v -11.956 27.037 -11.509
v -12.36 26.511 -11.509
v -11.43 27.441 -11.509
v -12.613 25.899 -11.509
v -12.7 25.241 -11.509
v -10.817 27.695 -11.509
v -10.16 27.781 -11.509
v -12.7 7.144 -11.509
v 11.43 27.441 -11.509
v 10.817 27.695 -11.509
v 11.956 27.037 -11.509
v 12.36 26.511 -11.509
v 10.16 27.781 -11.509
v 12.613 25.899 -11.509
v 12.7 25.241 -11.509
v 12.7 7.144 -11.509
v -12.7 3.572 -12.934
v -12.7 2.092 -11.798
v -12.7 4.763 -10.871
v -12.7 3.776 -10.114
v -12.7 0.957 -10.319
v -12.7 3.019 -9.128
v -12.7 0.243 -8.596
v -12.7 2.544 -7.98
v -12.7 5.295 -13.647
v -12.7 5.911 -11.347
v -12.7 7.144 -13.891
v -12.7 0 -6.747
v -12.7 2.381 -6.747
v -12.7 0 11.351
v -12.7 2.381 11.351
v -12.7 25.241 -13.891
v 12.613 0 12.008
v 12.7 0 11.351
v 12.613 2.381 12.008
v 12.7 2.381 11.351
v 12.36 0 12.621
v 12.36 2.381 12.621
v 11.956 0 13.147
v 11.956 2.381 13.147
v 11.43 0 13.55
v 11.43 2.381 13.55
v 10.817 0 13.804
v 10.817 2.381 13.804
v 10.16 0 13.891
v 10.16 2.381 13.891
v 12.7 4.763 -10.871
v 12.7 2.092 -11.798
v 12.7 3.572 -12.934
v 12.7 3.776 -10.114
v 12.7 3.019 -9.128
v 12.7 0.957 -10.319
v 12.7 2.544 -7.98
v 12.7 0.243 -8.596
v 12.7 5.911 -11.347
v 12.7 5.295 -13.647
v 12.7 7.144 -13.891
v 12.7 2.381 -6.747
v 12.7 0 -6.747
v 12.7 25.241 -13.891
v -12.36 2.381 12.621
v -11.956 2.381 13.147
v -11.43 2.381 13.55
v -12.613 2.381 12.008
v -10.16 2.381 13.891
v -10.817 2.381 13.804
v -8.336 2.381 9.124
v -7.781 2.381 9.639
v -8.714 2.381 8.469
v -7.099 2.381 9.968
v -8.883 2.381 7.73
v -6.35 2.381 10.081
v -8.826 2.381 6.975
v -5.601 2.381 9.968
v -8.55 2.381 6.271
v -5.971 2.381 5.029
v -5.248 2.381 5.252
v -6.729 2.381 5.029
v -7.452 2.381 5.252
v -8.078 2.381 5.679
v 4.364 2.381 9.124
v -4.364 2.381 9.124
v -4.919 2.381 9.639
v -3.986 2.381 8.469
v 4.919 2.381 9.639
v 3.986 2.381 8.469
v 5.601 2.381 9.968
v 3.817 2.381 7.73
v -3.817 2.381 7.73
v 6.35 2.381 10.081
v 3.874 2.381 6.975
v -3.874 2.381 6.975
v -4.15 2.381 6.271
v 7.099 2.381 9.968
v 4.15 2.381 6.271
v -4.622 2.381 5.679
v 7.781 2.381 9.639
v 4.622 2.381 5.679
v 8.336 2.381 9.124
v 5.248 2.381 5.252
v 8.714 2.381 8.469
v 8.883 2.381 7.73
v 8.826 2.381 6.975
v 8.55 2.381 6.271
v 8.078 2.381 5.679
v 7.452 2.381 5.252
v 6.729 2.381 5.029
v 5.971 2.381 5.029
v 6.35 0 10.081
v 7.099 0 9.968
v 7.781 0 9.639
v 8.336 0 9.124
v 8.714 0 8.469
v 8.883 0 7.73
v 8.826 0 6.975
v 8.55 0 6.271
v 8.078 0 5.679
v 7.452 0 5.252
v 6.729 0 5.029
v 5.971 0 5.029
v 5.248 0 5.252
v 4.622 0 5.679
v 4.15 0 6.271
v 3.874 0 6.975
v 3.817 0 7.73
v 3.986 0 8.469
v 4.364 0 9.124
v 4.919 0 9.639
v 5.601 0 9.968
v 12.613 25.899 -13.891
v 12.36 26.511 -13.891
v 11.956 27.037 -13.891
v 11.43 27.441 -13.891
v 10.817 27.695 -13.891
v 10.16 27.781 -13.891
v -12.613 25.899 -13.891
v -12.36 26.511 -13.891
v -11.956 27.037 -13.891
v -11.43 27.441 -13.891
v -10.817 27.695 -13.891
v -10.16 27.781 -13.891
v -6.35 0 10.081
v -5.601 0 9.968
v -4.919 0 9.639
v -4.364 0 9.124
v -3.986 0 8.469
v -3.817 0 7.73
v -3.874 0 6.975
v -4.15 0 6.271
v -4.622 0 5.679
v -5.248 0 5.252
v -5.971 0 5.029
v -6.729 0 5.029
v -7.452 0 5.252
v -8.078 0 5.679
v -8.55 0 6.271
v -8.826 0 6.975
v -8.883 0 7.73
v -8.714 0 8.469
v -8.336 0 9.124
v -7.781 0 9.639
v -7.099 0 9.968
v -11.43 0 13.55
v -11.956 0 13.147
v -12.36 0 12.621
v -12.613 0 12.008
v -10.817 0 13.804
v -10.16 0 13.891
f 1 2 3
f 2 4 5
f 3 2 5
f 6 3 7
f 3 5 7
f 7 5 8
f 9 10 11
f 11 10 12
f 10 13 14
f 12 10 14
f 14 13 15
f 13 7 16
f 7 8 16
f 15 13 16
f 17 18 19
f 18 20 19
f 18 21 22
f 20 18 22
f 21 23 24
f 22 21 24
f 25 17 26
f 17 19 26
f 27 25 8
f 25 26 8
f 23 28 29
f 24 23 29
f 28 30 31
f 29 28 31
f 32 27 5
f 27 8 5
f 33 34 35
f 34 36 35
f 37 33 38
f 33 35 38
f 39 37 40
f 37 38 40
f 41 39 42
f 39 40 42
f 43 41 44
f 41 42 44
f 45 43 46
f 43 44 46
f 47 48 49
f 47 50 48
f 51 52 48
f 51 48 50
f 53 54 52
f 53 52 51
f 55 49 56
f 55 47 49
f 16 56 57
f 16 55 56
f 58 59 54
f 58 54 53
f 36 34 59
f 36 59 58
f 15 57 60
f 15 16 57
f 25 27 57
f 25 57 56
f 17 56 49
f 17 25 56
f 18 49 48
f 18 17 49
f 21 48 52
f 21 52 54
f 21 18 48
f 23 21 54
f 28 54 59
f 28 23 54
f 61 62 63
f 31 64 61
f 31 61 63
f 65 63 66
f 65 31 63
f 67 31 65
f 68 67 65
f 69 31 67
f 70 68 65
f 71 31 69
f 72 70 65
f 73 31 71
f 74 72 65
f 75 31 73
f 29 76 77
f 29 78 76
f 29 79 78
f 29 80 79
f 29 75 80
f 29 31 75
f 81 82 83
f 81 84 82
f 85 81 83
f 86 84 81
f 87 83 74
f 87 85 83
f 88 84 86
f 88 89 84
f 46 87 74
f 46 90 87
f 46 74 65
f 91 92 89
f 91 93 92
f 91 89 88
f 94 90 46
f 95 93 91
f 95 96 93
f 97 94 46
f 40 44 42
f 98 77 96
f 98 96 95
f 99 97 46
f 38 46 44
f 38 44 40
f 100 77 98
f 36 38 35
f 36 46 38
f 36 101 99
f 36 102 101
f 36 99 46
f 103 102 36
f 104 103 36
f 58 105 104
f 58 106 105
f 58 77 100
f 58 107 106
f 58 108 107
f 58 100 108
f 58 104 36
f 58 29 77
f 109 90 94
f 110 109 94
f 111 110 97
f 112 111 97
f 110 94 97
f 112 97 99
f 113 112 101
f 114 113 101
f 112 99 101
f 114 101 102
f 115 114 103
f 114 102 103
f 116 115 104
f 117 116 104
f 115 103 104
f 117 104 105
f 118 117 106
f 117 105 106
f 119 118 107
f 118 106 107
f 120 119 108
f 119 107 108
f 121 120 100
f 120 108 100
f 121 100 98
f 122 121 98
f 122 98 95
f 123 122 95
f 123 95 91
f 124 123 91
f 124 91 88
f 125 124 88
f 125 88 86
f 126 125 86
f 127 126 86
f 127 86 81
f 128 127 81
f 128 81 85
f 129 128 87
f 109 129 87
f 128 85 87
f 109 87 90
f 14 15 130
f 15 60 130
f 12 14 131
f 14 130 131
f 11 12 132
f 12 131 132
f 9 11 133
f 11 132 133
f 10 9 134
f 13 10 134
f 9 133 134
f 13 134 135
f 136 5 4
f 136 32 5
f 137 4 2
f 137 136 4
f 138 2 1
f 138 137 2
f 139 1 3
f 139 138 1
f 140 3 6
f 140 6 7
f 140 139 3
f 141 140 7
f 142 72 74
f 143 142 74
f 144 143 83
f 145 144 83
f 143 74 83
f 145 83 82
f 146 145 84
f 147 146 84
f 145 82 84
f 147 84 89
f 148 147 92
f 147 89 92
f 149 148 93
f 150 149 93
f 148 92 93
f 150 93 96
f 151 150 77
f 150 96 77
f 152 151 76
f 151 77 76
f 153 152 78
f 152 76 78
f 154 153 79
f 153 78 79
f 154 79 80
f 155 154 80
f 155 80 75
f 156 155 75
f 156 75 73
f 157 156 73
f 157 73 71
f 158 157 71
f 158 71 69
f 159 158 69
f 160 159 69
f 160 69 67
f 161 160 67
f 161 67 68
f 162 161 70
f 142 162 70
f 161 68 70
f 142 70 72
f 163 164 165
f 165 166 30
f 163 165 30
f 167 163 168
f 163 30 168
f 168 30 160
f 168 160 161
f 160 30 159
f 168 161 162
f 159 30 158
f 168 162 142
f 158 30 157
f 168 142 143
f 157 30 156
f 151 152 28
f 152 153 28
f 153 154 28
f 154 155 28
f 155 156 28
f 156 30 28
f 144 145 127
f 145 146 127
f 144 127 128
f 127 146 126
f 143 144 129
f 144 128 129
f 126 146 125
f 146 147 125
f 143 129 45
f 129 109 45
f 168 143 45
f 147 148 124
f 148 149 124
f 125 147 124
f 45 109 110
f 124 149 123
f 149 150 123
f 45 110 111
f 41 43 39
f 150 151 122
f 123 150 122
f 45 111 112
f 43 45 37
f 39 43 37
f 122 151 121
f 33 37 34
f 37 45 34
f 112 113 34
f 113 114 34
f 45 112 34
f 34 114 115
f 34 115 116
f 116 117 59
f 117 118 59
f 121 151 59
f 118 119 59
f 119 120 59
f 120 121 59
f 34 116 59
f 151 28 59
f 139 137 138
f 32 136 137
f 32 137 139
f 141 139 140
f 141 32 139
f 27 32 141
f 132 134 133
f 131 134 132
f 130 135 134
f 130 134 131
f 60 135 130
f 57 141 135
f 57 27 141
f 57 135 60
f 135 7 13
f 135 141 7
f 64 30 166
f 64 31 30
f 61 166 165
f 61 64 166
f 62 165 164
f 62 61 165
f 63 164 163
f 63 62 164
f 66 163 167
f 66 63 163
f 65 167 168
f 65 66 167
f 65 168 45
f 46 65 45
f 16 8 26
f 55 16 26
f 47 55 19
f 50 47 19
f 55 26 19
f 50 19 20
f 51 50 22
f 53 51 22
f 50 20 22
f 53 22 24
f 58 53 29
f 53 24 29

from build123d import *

# Parameters (mm, degrees)
SKETCH1_W              = 25.4
SKETCH1_H              = 27.78125
BOSS_EXTRUDE1_DEPTH    = 2.38125
SKETCH2_W              = 25.4
SKETCH2_H              = 2.38125
BOSS_EXTRUDE2_DEPTH    = 25.4
CONVERT_SOLID2_START   = -12.7
CONVERT_SOLID2_DEPTH   = 25.4
CONVERT_SOLID2_2_DEPTH = 25.4
FILLET1_R              = 2.54
SKETCH9_R              = 2.54
CUT_EXTRUDE1_DEPTH     = 2.38125


# Read off the part's stored shape, not the designer's step: Convert-Solid2
with BuildPart() as part:
    # Sketch1 → Boss-Extrude1 (new body)
    with BuildSketch(Plane(origin=(0, 0, 0), x_dir=(1, 0, 0), z_dir=(0, 1, 0))):
        Rectangle(SKETCH1_W, SKETCH1_H)
    extrude(amount=BOSS_EXTRUDE1_DEPTH)

    # Sketch2 → Boss-Extrude2 (add)
    with BuildSketch(Plane(origin=(0, 2.38125, 0), x_dir=(1, 0, 0), z_dir=(0, 1, 0))):
        with Locations((0, 12.7)):
            Rectangle(SKETCH2_W, SKETCH2_H)
    extrude(amount=BOSS_EXTRUDE2_DEPTH)

    # Convert-Solid2 outline → Convert-Solid2 (cut)
    with BuildSketch(Plane.YZ.offset(CONVERT_SOLID2_START)):
        with BuildLine():
            Line((0, -13.890625), (7.14375, -13.890625))
            ThreePointArc((7.14375, -13.890625), (2.092355932, -11.798269068), (0, -6.746875))
            Line((0, -6.746875), (0, -13.890625))
        make_face()
    extrude(amount=CONVERT_SOLID2_DEPTH, mode=Mode.SUBTRACT)

    # Convert-Solid2 2 outline → Convert-Solid2 2 (add)
    with BuildSketch(Plane.YZ.offset(CONVERT_SOLID2_START)):
        with BuildLine():
            Line((2.38125, -11.509375), (7.14375, -11.509375))
            ThreePointArc((7.14375, -11.509375), (3.776153955, -10.114471045), (2.38125, -6.746875))
            Line((2.38125, -6.746875), (2.38125, -11.509375))
        make_face()
    extrude(amount=CONVERT_SOLID2_2_DEPTH)

    # Fillet1
    fillet1_edges = [part.edges().sort_by_distance(p)[0] for p in [
        (-12.7, 1.190625, 13.890625),
        (12.7, 1.190625, 13.890625),
        (-12.7, 27.78125, -12.7),
        (12.7, 27.78125, -12.7),
    ]]
    fillet(fillet1_edges, radius=FILLET1_R)

    # Sketch9 → Cut-Extrude1 (cut)
    with BuildSketch(Plane(origin=(0, 2.38125, 0), x_dir=(1, 0, 0), z_dir=(0, 1, 0))):
        with Locations(Location((6.35, -7.540625, 0), (0, 0, 270))):
            Circle(SKETCH9_R)
        with Locations(Location((-6.35, -7.540625, 0), (0, 0, 270))):
            Circle(SKETCH9_R)
    extrude(amount=-CUT_EXTRUDE1_DEPTH, mode=Mode.SUBTRACT)


solid = part.part
